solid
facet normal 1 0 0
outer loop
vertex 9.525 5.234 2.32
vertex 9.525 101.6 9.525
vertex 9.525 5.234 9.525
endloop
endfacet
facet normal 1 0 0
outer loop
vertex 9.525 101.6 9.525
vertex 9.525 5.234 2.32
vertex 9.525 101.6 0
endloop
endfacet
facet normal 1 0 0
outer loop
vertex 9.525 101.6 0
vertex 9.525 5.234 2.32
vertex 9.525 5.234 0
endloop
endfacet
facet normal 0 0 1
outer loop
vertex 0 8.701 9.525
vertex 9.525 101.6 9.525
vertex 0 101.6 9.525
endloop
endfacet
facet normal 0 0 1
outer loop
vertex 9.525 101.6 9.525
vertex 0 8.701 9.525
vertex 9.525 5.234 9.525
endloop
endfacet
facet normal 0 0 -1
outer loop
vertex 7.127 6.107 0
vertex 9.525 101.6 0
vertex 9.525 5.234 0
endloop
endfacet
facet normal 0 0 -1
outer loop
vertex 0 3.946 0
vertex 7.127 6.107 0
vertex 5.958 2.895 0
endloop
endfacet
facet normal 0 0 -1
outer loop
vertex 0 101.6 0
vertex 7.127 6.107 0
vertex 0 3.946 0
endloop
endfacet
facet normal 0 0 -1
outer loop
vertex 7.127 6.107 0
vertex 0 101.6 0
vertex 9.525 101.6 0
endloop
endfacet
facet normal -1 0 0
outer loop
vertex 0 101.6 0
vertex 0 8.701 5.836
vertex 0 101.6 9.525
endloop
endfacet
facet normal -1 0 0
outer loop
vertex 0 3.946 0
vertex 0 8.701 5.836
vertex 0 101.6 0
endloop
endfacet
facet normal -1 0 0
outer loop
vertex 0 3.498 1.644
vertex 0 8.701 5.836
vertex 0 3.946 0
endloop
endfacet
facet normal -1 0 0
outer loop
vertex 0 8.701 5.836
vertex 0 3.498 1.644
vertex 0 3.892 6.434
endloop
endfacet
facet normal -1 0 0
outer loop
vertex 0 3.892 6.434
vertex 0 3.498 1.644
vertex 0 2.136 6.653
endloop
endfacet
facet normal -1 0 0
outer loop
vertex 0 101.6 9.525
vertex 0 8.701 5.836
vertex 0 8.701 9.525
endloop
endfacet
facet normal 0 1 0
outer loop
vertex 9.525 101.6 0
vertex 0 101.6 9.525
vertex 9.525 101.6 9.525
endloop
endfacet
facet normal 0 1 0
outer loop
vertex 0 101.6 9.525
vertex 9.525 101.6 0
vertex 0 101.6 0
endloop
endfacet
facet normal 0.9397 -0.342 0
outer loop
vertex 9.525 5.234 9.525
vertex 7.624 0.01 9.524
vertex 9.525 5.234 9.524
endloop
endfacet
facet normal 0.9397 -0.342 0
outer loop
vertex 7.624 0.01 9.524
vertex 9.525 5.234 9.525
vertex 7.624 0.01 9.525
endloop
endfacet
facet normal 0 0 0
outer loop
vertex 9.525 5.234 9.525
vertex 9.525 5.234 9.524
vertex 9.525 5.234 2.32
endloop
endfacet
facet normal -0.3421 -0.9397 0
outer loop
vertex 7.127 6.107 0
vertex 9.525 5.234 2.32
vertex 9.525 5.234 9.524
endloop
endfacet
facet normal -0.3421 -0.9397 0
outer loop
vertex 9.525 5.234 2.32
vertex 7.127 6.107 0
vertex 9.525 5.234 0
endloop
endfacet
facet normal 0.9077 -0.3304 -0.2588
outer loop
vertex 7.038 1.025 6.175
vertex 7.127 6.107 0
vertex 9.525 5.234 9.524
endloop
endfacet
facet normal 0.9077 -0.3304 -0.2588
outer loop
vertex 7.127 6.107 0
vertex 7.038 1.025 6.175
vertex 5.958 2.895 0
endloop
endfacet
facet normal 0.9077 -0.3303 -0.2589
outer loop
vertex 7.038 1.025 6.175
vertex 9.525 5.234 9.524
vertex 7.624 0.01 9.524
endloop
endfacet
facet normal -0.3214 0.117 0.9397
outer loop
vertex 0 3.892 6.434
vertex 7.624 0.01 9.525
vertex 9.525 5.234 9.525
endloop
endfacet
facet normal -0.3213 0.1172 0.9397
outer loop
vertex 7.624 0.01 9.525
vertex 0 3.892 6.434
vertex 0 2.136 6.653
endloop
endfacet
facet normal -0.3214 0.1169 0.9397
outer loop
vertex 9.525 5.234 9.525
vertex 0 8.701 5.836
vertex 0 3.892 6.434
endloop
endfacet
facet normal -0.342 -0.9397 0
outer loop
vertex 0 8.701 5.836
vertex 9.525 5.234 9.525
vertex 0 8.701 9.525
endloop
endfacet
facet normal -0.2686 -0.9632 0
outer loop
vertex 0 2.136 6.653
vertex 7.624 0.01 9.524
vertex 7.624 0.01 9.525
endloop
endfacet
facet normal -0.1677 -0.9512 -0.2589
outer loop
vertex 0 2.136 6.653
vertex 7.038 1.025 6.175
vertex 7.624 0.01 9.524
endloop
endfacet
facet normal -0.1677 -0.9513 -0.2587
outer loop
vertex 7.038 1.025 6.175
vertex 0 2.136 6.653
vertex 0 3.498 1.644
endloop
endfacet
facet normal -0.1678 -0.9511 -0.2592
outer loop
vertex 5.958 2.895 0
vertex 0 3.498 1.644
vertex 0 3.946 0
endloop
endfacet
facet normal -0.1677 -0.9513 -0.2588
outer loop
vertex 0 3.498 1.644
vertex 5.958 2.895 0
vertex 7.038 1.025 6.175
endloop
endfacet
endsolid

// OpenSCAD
// toolbit width in mm (default: 9.5 [3/8"])
$blank_h = 9.525; // [6.35:15.875]
// toolbit height in mm (default: 9.5 [3/8"])
$blank_v = 9.525; // [6.35:15.875]
// toolbit length in mm (default: 100 [4"])
$blank_len = 101.6; // [25:200]

// tool angles - see tool-angle-nomeclature.png


$side_rake = 20; //[0:35]
$side_cutting_edge = 20; // [0:35]
$side_relief = 15; //[0:20]
$end_cutting_edge = 10; //[0:45]
$end_relief = 15;// [0:40]
$back_rake = 5; //5; // [-35:35]
$nose_radius = 0; // [0]

$face_len = $blank_h - ($blank_h / 5); // [0:15.875]

$pad = 0.001;

// 1 : side rake
//   1.1 : triangle to get coords of pivot point
opp = ($blank_h - $face_len);
//b = $blank_h;
scea = 270-$side_cutting_edge;
adj = opp / tan($side_cutting_edge);
//echo(H=$blank_h, L=$face_len, ADJ=c,OPP=a,A=scea,TAN_A=tan($side_cutting_edge));
// pivot point is now ($blank_h, cadj $blank_v)
sce_pivot_x = $blank_h;
sce_pivot_y = adj;
sce_pivot_z = $blank_v;
sce_length = opp / sin($side_cutting_edge); //c; // fixme: h!
sce_width = opp;

// 2: side relief
sr_length = sce_length * 1.5; //FIXME
sr_width = sce_width * 1.5; //FIXME
sr_height = (2 * $blank_v); //FIXME
// 3: side rake

// front cutting edge
f_adj = $face_len;
f_opp = (tan($end_cutting_edge) * f_adj);
f_h = f_adj / cos($end_cutting_edge);
// front relief
fr_adj = $blank_v;
fr_opp = (tan($end_relief) * fr_adj);
fr_h = fr_adj / cos($end_relief);
    
// unused:
module rotate_about_pt(arr, pt) {
    translate(pt)
        rotate(arr)
            translate(-pt)
                children();   
}

difference() {
    // toolbit blank
    cube([$blank_h, $blank_len, $blank_v]);
    
    // side cutting edge
    if ($side_cutting_edge != 0) {
        // note + 0.001 to prevent artifacts
        translate([sce_pivot_x, sce_pivot_y, -$pad])
            rotate([0,0,scea])
                cube([sce_length, sce_width, $blank_v + (2*$pad)]); 
    }
     
    // side relief
    if ($side_relief != 0) {
        translate([sce_pivot_x, sce_pivot_y, -$pad])
            rotate([0,0,scea])
                // NOTE: we are increasing assumed-size from blank_v to sr_height
                translate([(sce_width), 0, $blank_v])
                    rotate([360-$side_relief,0, 0])
                        translate([-(sce_width), 0, -sr_height])
                            cube([sr_length, sr_width, sr_height + ($pad)]); 
    }
    
    // side rake
    if ($side_rake != 0) {
        // FIXME: difference out back of tool
        translate([sce_pivot_x, sce_pivot_y, $blank_v])
        rotate([90, 0, scea])
        rotate([$side_rake, 0])
        cube([sce_pivot_x, sce_pivot_y, sr_height]);
    }

    if ($end_cutting_edge != 0) {
        translate([$face_len, -f_opp, 0])
            // replace / 2 with half-f-opp for rotation
            translate([0, (f_opp / 2), 0])
                rotate([0,0,180 - $end_cutting_edge]) 
                    translate([0, -(f_opp / 2), 0])
                        // FIXME: $pad is not enough
                        // FIX the +1 +2 +3
                        cube([$face_len + 1 , f_opp + 3, $blank_v + 2]);
    }

    if ($end_relief != 0) {
        // FIXME: TF the deal with 0.4
        translate([$face_len, fr_opp - 0.4, 0])
            translate([fr_opp, 0, 0])
                rotate([360-$end_relief,0, 180 - $end_cutting_edge]) 
                    translate([-fr_opp, 0, 0])
                        cube([f_h * 2, fr_opp * 2, fr_h]); 
        /*
            translate([$face_len, f_opp - 0.6 , 0])
       translate([fr_opp, (f_opp / 2), 0])
      rotate([360-$end_relief,0, 180 - $end_cutting_edge]) 
        translate([-fr_opp, -(f_opp / 2), 0])
        cube([f_h * 2, fr_opp * 2, fr_h]); 
      */
    }

    // back rake
    if ( $back_rake != 0 ) {
        //translate([$face_len, fr_opp - 0.4, 0])
        
    }
}


/*
        translate([$face_len, fr_opp, $blank_v])
            //translate([0, (f_opp / 2), 0])
                rotate([$back_rake, $side_relief, 180 - $end_cutting_edge]) 
                    //translate([-fr_opp, 0, 0])
                        cube([f_h * 2, fr_opp * 2, fr_h]); 
*/
